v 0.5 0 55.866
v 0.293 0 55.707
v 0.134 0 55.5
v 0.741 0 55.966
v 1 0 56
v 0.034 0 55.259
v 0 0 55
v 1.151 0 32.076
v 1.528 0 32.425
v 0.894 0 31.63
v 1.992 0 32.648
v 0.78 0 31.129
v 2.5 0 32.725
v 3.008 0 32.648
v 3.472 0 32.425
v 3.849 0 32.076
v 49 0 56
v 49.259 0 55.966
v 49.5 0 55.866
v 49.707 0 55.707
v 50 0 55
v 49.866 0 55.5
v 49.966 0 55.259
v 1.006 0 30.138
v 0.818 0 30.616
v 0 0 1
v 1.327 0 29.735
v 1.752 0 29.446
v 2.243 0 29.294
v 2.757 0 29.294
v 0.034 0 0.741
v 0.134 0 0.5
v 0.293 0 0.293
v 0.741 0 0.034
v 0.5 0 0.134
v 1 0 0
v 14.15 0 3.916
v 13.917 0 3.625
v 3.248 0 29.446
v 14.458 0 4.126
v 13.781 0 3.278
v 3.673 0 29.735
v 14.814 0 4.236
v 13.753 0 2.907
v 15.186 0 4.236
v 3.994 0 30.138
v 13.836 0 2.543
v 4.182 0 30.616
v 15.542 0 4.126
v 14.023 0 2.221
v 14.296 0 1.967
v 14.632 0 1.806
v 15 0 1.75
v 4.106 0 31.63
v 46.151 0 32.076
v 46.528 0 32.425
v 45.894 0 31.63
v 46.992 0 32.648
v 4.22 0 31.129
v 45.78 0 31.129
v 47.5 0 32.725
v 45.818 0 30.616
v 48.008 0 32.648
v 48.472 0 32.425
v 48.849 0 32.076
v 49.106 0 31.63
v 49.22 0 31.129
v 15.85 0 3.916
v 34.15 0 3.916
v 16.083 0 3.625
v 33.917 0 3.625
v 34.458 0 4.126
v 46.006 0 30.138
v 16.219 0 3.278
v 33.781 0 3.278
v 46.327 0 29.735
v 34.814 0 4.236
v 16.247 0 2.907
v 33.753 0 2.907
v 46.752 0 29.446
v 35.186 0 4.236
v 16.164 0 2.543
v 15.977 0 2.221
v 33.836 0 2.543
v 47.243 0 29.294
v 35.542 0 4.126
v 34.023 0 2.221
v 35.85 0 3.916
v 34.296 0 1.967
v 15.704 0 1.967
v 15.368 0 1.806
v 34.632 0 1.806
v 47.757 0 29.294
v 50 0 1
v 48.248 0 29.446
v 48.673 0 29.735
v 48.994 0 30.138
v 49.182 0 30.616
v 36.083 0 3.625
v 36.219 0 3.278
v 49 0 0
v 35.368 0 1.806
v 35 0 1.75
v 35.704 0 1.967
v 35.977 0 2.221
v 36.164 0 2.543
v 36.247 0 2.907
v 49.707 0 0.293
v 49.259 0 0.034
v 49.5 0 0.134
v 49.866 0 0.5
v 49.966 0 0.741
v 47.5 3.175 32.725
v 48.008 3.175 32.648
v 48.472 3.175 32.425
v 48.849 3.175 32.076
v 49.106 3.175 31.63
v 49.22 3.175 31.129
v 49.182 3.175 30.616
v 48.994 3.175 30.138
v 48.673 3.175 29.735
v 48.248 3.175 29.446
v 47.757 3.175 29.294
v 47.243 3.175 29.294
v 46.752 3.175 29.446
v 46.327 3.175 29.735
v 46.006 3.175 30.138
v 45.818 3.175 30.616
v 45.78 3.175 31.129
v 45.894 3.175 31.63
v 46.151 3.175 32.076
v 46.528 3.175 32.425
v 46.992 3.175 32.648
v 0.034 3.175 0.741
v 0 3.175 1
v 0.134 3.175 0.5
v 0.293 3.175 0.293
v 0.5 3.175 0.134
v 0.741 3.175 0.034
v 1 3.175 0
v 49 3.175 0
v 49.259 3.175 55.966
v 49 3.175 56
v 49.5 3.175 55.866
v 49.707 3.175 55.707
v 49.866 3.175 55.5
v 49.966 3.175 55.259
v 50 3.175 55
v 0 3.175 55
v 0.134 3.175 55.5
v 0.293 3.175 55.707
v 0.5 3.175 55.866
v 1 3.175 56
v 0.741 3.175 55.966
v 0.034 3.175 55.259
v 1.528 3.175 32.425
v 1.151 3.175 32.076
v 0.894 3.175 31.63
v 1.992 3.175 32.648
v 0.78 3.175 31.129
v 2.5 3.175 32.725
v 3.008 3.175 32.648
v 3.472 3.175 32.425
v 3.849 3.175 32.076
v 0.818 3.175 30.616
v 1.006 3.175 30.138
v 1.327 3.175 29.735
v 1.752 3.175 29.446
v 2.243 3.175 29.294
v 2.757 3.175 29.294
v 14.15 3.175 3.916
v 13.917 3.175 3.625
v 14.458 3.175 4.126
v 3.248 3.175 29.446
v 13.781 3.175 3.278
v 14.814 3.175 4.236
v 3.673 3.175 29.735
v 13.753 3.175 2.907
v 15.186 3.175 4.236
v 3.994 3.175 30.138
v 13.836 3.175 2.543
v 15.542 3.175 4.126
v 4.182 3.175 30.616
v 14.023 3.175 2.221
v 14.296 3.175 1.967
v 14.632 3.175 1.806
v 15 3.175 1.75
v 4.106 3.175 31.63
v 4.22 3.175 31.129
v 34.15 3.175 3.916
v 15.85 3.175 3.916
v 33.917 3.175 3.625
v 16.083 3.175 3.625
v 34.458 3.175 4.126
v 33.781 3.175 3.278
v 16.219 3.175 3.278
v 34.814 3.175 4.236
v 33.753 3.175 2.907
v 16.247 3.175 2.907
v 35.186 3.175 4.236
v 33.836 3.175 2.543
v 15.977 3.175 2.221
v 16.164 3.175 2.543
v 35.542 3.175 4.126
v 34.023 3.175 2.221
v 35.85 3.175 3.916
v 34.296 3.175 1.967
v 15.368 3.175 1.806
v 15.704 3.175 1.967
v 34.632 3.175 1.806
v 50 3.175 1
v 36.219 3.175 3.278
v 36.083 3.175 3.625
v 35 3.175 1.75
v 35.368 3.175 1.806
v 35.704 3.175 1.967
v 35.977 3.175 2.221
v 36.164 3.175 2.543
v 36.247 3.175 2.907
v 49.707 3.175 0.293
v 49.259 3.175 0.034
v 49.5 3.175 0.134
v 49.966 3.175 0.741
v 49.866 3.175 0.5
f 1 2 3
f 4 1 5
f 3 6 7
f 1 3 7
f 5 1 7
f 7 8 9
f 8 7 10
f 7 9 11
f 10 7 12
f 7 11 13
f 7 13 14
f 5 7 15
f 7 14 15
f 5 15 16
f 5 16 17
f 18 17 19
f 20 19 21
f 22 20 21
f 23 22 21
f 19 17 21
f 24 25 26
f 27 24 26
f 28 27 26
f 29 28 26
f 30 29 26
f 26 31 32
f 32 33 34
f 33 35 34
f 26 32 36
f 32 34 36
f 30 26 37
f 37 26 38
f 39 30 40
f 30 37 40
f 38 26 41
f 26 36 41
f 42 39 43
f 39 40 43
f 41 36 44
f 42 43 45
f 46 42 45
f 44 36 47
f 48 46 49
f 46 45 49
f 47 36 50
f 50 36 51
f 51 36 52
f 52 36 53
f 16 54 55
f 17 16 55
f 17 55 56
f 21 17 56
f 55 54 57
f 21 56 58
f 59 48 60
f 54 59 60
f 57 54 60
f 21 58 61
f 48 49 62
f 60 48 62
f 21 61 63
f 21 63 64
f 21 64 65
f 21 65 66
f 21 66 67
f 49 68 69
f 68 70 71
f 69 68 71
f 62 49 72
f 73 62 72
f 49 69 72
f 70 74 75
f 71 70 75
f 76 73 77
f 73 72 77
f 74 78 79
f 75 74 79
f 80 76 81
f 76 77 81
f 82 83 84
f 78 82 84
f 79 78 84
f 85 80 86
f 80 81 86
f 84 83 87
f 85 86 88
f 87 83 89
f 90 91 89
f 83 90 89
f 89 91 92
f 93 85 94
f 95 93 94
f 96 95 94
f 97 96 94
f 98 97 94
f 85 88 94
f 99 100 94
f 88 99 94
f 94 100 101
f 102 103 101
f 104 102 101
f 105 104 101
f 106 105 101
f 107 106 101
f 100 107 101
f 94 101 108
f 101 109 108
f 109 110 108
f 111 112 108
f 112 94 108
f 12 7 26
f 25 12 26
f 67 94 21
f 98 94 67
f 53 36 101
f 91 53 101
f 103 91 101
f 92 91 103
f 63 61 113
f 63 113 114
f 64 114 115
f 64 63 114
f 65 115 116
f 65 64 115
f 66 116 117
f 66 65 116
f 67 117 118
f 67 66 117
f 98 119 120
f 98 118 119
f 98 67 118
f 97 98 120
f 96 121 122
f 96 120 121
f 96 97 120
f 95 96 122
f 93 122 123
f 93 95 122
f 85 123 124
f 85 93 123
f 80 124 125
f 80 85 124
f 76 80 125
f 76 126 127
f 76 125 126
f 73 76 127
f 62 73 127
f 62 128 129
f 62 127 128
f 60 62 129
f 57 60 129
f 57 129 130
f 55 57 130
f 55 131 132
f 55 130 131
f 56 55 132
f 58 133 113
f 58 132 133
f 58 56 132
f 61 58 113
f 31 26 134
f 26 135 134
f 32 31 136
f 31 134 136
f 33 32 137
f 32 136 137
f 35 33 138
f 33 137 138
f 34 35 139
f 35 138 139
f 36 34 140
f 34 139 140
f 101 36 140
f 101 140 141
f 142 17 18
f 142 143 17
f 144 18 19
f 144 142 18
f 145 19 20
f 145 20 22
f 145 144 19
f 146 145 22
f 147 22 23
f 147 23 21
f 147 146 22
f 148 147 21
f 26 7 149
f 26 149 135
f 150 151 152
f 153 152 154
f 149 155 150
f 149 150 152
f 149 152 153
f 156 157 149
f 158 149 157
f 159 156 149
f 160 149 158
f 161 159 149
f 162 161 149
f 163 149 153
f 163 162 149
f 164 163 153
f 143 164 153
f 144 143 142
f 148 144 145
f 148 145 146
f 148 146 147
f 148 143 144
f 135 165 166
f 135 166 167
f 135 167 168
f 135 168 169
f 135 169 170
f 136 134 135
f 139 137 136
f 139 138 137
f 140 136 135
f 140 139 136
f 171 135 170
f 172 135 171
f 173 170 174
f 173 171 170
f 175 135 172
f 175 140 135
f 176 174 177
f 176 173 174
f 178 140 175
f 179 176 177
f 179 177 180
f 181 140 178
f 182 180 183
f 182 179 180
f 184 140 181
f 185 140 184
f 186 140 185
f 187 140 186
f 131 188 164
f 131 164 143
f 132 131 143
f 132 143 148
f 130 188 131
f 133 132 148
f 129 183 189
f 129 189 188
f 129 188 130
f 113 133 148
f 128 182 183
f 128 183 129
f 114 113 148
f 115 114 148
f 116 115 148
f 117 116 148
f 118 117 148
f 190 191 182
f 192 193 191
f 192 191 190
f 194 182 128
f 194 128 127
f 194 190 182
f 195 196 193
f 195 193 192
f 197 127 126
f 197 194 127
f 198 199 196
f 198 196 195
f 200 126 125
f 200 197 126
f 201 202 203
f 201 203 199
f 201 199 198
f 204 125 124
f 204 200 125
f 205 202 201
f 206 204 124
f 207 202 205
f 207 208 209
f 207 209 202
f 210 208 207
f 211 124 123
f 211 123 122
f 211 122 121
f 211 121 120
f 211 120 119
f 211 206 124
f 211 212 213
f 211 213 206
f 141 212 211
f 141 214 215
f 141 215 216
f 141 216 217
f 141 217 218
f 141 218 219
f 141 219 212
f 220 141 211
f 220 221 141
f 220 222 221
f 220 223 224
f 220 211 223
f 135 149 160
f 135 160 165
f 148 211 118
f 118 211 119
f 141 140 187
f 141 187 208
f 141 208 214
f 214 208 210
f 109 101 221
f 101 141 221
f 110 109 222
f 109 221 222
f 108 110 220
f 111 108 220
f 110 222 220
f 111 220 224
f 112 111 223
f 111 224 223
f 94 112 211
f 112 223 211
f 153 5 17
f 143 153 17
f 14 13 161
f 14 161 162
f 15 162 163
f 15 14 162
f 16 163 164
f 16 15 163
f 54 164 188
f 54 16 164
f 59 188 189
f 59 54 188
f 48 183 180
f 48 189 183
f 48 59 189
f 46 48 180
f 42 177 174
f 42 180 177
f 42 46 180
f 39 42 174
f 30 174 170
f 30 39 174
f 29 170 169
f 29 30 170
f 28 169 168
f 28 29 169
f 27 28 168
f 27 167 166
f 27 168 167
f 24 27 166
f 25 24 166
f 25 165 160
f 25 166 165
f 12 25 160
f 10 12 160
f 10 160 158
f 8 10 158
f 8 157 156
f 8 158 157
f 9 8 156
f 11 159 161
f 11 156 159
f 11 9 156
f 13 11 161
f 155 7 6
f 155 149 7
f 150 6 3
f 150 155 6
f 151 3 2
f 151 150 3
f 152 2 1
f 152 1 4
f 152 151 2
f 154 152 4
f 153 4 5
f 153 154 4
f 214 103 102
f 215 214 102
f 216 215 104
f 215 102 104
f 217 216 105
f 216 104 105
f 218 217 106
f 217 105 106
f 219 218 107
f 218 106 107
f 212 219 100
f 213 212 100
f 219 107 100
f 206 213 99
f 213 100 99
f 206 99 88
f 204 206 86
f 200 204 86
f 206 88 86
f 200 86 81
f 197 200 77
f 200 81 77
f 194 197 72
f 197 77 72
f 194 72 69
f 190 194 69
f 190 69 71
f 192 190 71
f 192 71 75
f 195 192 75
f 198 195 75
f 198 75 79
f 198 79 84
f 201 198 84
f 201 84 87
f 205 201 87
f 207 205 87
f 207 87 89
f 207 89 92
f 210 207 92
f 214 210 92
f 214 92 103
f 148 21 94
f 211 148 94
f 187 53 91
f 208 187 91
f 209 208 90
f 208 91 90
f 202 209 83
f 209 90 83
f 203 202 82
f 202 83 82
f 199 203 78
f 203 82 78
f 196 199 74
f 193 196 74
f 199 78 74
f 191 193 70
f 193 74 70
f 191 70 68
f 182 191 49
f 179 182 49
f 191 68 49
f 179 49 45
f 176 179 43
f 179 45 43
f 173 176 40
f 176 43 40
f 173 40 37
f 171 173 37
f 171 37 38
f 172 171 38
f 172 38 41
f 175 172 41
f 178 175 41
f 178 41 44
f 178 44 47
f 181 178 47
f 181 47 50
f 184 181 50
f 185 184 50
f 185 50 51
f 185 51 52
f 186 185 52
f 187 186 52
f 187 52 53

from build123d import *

# Parameters (mm, degrees)
SKETCH1_W               = 50
SKETCH1_H               = 56
SKETCH1_R               = 1.1
BOSS_EXTRUDE1_DEPTH     = 3.175
FILLET1_R               = 1
M3X0_5_TAPPED_HOLE1_D   = 2.5
CUT_EXTRUDE1_DEPTH      = 76.140406074
CUT_EXTRUDE1_DEPTH_BACK = 76.140406074
SKETCH3_R               = 1.725


with BuildPart() as part:
    # Sketch1 → Boss-Extrude1 (new body)
    with BuildSketch(Plane(origin=(0, 0, 0), x_dir=(1, 0, 0), z_dir=(0, 1, 0))):
        with Locations((25, -28)):
            Rectangle(SKETCH1_W, SKETCH1_H)
        with Locations(Location((15, -3, 0), (0, 0, 270))):
            Circle(SKETCH1_R, mode=Mode.SUBTRACT)
        with Locations(Location((35, -3, 0), (0, 0, 270))):
            Circle(SKETCH1_R, mode=Mode.SUBTRACT)
    extrude(amount=BOSS_EXTRUDE1_DEPTH)

    # Fillet1
    fillet1_edges = [part.edges().sort_by_distance(p)[0] for p in [
        (0, 1.5875, 0),
        (50, 1.5875, 0),
        (50, 1.5875, 56),
        (0, 1.5875, 56),
    ]]
    fillet(fillet1_edges, radius=FILLET1_R)

    # M3x0.5 Tapped Hole1 (through all)
    with Locations(Plane(origin=(15, 3.175, 3), x_dir=(0, 0, 1), z_dir=(0, 1, 0))):
        with Locations((0, 0), (0, 20)):
            Hole(M3X0_5_TAPPED_HOLE1_D / 2)

    # Sketch3 → Cut-Extrude1 (cut, two sides: drawn at the far end of the back side and taken through both)
    with BuildSketch(Plane(origin=(0, 3.175, 0), x_dir=(1, 0, 0), z_dir=(0, 1, 0)).offset(-CUT_EXTRUDE1_DEPTH_BACK)):
        with Locations(Location((2.5, -31, 0), (0, 0, 270))):
            Circle(SKETCH3_R)
        with Locations(Location((47.5, -31, 0), (0, 0, 270))):
            Circle(SKETCH3_R)
    extrude(amount=CUT_EXTRUDE1_DEPTH + CUT_EXTRUDE1_DEPTH_BACK, mode=Mode.SUBTRACT)


solid = part.part
